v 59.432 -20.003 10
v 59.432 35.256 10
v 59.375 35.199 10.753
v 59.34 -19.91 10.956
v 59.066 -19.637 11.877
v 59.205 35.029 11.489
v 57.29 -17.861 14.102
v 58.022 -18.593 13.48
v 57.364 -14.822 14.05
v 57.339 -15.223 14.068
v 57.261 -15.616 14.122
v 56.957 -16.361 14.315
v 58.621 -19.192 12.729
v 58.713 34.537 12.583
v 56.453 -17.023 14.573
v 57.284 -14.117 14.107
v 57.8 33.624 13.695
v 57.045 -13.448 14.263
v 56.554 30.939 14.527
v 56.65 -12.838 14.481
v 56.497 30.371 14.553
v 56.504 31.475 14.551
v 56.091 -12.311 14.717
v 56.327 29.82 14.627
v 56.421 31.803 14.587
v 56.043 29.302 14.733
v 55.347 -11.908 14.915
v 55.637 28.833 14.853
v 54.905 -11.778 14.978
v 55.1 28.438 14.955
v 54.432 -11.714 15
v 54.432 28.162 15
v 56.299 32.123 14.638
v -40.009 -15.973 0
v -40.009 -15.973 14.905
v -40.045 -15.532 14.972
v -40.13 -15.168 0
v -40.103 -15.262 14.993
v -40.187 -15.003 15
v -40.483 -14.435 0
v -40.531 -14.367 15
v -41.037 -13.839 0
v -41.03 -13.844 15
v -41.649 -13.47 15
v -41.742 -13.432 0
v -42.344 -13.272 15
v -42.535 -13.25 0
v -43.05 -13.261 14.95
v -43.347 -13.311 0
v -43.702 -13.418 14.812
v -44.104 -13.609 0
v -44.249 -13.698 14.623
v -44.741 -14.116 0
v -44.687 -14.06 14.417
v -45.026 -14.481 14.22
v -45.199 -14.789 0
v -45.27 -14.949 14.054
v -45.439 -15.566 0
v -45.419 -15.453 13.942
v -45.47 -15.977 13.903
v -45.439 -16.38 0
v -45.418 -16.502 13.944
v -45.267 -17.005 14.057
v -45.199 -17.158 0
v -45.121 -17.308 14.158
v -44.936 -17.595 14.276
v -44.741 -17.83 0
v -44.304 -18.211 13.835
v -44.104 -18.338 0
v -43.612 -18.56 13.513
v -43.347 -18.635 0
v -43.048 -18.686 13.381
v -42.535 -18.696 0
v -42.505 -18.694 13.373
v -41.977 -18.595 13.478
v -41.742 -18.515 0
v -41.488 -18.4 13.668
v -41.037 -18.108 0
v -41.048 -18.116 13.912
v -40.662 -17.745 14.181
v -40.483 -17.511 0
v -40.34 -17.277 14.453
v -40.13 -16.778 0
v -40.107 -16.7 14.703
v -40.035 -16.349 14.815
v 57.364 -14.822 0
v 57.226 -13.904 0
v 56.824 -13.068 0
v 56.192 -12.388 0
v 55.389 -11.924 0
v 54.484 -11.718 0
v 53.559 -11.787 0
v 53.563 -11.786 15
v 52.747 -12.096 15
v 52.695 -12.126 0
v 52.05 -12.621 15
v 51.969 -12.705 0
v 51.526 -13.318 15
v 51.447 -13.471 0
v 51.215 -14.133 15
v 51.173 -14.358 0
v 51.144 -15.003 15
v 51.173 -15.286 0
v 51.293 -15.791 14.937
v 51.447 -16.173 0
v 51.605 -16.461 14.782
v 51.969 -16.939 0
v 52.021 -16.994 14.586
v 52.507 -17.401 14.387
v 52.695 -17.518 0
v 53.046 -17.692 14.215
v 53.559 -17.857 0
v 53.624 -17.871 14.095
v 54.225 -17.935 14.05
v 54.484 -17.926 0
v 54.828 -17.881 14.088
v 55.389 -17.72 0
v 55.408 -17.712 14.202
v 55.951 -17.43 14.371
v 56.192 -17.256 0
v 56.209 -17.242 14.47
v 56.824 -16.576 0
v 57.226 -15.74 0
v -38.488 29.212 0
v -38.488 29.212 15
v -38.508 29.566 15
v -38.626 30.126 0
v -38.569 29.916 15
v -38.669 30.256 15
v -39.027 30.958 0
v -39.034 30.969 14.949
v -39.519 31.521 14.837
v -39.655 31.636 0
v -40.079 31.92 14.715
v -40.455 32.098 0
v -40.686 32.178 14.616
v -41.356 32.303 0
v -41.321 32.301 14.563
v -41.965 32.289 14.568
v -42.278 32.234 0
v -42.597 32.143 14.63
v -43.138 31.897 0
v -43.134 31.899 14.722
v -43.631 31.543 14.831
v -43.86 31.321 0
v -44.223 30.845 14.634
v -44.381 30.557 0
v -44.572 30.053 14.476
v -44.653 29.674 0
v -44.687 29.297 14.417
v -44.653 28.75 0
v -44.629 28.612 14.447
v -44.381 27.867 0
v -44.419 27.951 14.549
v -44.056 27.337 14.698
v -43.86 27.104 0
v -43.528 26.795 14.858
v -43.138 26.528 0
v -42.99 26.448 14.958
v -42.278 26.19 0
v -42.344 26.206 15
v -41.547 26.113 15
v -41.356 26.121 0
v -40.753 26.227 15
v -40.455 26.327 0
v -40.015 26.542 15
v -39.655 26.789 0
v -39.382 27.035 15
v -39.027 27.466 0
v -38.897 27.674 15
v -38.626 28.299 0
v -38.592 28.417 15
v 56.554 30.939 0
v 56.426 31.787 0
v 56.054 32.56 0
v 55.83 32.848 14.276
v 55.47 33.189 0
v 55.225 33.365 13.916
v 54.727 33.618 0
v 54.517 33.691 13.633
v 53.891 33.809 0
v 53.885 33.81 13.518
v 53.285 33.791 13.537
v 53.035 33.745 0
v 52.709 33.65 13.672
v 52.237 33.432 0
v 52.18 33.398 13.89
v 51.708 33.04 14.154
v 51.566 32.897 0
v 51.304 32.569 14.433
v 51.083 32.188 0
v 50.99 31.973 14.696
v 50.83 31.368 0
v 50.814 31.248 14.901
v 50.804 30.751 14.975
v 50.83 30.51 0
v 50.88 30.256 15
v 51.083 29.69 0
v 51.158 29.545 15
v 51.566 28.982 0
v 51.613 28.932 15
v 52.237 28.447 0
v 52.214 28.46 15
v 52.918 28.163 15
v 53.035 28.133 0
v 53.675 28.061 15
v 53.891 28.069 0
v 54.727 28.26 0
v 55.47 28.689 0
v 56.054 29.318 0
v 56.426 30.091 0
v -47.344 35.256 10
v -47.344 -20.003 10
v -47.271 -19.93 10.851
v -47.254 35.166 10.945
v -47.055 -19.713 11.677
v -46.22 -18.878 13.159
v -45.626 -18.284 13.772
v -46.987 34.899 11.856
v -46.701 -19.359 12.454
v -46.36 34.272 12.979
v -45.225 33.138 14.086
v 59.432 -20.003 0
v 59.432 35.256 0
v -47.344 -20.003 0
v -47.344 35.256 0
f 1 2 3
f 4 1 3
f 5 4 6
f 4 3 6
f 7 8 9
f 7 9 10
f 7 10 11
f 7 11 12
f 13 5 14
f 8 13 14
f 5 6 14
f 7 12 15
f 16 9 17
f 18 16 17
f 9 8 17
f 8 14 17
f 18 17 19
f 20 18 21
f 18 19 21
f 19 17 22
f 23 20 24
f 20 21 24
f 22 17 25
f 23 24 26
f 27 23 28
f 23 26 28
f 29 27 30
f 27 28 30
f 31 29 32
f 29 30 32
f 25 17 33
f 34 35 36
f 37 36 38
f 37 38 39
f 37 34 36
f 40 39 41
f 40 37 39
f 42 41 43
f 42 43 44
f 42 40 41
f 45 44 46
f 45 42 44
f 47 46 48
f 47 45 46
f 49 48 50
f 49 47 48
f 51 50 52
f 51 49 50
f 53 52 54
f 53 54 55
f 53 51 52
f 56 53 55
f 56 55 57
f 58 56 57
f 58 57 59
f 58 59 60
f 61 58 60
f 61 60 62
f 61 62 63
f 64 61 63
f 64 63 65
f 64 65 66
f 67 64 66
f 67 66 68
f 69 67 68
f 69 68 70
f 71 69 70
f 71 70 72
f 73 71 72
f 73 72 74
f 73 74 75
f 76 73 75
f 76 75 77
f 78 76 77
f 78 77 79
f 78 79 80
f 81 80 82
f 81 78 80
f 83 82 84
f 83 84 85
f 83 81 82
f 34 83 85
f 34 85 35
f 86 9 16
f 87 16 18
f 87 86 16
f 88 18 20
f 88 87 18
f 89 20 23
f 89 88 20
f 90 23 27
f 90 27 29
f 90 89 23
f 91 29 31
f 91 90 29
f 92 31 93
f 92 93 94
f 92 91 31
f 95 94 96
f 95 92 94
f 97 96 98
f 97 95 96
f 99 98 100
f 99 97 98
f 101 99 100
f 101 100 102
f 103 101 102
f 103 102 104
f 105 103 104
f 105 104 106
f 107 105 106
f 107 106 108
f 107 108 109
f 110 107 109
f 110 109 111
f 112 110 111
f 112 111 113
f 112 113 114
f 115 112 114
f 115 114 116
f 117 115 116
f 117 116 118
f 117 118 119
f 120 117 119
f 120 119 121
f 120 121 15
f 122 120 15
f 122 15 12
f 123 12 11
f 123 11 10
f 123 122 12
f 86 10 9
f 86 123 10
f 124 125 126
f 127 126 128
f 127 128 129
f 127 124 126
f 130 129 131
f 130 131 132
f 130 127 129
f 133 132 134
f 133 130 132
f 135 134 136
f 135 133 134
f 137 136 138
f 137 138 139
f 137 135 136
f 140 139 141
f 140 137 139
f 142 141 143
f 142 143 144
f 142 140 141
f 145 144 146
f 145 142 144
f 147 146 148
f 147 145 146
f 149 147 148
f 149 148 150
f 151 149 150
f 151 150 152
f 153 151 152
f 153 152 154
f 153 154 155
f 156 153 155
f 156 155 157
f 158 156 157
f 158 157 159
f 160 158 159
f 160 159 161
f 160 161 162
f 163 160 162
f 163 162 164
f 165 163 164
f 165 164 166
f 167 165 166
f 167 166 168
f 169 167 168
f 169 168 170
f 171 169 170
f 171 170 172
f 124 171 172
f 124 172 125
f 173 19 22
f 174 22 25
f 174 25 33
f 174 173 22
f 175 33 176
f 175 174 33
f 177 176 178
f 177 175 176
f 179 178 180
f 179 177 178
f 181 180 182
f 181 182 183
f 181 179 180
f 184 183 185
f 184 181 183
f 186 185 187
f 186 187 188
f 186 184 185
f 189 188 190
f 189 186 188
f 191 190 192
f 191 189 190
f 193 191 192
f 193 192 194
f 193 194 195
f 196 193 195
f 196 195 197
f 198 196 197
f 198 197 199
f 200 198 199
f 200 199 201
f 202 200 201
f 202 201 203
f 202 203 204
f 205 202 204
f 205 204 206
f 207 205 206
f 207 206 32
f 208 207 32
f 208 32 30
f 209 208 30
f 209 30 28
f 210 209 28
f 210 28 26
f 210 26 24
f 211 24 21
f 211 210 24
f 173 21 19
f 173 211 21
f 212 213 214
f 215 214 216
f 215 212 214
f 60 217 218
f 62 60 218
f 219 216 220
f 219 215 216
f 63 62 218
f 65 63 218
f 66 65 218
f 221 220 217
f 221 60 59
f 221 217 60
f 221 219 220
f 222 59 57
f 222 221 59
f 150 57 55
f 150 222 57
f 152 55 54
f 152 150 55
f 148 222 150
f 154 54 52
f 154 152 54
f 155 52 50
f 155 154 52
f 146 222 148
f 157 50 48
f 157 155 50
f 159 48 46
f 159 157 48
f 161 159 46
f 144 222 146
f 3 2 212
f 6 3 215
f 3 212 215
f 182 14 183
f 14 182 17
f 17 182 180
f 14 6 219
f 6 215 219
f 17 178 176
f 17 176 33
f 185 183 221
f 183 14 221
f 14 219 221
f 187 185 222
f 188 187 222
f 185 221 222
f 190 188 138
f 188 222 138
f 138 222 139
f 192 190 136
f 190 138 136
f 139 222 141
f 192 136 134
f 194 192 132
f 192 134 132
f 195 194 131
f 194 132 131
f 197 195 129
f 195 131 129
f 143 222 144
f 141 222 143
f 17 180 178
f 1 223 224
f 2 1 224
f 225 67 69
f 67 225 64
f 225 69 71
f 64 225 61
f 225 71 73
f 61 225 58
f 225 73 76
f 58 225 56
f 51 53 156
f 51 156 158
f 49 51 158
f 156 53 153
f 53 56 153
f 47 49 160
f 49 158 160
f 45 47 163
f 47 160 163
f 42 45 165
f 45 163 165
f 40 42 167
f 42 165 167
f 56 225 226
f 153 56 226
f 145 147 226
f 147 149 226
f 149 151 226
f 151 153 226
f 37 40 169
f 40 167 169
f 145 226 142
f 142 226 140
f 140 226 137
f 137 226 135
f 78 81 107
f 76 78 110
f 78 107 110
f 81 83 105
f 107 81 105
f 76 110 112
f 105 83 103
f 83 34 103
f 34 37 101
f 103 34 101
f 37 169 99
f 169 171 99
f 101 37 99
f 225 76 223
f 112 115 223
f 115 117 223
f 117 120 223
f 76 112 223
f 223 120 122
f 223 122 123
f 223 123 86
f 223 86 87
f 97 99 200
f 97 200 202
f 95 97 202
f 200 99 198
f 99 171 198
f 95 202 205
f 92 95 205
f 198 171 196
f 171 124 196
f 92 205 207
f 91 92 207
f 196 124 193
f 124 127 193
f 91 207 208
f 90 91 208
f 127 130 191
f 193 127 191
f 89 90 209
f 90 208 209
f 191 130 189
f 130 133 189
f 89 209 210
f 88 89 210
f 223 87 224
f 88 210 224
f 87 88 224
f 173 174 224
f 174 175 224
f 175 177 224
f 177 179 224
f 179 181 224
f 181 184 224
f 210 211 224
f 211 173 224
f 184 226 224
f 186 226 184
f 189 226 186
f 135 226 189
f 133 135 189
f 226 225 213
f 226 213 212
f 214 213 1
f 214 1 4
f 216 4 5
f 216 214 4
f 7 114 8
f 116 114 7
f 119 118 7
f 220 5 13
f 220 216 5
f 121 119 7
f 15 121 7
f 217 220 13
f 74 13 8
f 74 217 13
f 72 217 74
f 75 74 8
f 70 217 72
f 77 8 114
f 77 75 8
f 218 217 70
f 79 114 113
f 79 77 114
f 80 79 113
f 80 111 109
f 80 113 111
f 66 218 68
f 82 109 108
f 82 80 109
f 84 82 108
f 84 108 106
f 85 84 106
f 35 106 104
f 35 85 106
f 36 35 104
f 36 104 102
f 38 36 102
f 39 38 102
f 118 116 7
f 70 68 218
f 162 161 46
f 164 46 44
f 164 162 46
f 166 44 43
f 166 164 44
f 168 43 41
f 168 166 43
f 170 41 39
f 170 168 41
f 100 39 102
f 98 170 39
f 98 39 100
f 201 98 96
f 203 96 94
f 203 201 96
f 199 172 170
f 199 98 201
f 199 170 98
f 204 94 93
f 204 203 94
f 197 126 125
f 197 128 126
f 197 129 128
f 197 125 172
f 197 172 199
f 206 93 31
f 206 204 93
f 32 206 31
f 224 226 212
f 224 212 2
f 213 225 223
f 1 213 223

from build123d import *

# Parameters (mm, degrees)
F0_W        = 106.775932014
F0_H        = 55.2587080747
F0_R        = 2.7303671047
F0_R_2      = 3.1130972935
F0_R_3      = 3.09976381
F0_R_4      = 2.8780568391
F1_DEPTH    = 15
F2_T1_DEPTH = 131.775932014
F2_T3_DEPTH = 80.2587080747


# Not quite as in the source:
# - a fillet or chamfer that OpenCascade refuses, or shapes differently, is made with other operations: its cross-section is extruded or revolved along the edge and cut away or added


with BuildPart() as f1:
    # F0 (on Top) → F1 (new body)
    with BuildSketch(Plane.XY):
        with Locations((6.0439184308, 7.6268529519)):
            Rectangle(F0_W, F0_H)
        with Locations((-42.7391566336, -15.973219648)):
            Circle(F0_R, mode=Mode.SUBTRACT)
        with Locations((54.2513802648, -14.8219969124)):
            Circle(F0_R_2, mode=Mode.SUBTRACT)
        with Locations((-41.587933898, 29.2122848332)):
            Circle(F0_R_3, mode=Mode.SUBTRACT)
        with Locations((53.6757707596, 30.9391189367)):
            Circle(F0_R_4, mode=Mode.SUBTRACT)
    extrude(amount=F1_DEPTH)

    # F2: fillet of radius 5 on 4 edges, made by hand

    # F2_s2 → F2_t1 (cut)
    with BuildSketch(Plane.YZ.offset(-59.8440475762)):
        with BuildLine():
            ThreePointArc((-20.0025010854, 10), (-18.5380349913, 13.5355339059), (-15.0025010854, 15))
            Line((-15.0025010854, 15), (-20.0025010854, 15))
            Line((-20.0025010854, 15), (-20.0025010854, 10))
        make_face()
        with BuildLine():
            ThreePointArc((35.2562069893, 10), (33.7917408952, 13.5355339059), (30.2562069893, 15))
            Line((30.2562069893, 15), (35.2562069893, 15))
            Line((35.2562069893, 15), (35.2562069893, 10))
        make_face()
    extrude(amount=F2_T1_DEPTH, mode=Mode.SUBTRACT)

    # F2_s4 → F2_t3 (cut)
    with BuildSketch(Plane.XZ.offset(-47.7562069893)):
        with BuildLine():
            ThreePointArc((59.4318844378, 10), (57.9674183437, 13.5355339059), (54.4318844378, 15))
            Line((54.4318844378, 15), (59.4318844378, 15))
            Line((59.4318844378, 15), (59.4318844378, 10))
        make_face()
        with BuildLine():
            ThreePointArc((-47.3440475762, 10), (-45.8795814821, 13.5355339059), (-42.3440475762, 15))
            Line((-42.3440475762, 15), (-47.3440475762, 15))
            Line((-47.3440475762, 15), (-47.3440475762, 10))
        make_face()
    extrude(amount=F2_T3_DEPTH, mode=Mode.SUBTRACT)


solid = f1.part
